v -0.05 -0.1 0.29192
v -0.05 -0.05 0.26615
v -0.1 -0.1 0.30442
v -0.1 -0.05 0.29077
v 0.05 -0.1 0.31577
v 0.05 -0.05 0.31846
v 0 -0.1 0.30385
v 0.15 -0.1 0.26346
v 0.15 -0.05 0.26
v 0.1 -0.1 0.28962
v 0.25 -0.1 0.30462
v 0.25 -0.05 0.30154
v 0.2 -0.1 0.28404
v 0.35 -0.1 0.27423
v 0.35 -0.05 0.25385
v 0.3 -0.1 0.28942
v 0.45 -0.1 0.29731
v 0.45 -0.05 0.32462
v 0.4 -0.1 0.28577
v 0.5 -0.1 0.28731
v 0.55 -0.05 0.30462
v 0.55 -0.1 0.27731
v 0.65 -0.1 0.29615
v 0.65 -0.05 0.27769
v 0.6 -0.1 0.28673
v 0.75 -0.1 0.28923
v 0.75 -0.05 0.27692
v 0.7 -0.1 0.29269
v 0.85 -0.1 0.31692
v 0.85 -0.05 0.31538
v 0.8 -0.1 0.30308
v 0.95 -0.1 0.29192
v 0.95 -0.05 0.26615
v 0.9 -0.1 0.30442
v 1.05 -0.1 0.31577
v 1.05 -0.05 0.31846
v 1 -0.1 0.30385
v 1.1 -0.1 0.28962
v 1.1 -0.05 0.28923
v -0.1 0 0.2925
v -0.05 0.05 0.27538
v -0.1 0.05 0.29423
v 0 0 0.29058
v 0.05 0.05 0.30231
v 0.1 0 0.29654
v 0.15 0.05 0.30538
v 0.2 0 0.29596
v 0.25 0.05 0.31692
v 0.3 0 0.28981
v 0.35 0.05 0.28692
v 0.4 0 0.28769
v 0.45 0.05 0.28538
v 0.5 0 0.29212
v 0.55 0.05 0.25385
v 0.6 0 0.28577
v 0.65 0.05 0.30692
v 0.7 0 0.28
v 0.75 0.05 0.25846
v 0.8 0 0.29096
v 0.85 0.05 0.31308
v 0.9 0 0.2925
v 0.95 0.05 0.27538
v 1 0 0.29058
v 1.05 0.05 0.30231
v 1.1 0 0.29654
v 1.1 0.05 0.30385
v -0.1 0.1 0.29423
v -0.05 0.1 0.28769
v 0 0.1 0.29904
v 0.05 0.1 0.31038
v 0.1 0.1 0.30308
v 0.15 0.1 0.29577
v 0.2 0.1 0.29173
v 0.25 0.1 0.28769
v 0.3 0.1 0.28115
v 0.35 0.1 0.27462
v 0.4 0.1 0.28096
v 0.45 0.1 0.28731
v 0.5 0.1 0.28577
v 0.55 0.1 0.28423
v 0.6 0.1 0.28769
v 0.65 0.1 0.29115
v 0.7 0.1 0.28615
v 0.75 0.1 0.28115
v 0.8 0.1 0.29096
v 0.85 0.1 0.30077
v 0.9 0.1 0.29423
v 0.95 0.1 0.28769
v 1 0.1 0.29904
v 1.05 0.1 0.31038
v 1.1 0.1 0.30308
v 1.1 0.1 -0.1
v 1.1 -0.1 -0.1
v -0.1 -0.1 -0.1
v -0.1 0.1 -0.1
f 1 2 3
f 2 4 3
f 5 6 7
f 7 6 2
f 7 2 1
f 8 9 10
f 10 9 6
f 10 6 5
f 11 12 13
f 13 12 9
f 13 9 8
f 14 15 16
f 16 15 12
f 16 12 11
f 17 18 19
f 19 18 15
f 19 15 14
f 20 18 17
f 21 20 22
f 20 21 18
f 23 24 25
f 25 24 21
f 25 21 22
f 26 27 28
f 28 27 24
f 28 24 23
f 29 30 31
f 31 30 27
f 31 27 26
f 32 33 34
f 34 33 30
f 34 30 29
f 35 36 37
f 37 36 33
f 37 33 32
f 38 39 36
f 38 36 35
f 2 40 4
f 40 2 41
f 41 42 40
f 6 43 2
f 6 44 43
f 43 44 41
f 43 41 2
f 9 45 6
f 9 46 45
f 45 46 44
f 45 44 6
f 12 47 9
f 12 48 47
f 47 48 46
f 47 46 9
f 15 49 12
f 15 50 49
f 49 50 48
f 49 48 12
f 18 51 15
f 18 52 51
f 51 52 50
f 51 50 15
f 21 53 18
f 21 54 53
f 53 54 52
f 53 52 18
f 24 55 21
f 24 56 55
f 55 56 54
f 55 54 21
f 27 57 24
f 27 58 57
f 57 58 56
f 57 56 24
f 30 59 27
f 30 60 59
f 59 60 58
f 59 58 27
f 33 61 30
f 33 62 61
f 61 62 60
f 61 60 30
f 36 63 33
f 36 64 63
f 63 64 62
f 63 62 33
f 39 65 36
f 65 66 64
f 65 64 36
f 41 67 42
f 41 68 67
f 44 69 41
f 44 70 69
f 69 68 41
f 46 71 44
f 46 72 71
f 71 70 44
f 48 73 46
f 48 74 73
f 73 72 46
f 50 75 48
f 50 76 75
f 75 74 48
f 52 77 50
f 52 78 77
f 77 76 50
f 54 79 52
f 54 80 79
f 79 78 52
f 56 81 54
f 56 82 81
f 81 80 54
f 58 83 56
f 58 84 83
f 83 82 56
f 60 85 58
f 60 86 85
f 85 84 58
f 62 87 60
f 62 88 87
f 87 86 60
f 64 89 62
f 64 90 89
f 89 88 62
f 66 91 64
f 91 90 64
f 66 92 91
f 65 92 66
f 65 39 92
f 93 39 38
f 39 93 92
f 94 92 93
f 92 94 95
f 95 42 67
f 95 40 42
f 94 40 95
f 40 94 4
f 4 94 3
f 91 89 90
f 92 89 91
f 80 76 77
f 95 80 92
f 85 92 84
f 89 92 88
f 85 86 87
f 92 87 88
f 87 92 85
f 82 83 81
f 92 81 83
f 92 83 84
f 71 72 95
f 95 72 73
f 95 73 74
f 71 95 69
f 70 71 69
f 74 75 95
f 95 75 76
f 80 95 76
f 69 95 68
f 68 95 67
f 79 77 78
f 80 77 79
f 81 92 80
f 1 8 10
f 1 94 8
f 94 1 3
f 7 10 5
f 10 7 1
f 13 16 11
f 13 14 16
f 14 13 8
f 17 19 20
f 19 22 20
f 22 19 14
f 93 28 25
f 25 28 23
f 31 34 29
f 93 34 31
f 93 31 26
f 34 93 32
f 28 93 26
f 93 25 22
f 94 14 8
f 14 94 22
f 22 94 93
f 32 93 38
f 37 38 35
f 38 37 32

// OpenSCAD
intersection() {
    color([0.3, 0.3, 0.5])
    translate([-0.1,-0.1,-0.1])
    cube([1.2, .2, 1.2], false);

    translate([-.15,-.15,.25])
    scale([1/10,1/10, 1/13])
    union() {
        surface("jagged.dat");
        translate([0,0,-13])
        cube([13,13,13]);
    }
}
